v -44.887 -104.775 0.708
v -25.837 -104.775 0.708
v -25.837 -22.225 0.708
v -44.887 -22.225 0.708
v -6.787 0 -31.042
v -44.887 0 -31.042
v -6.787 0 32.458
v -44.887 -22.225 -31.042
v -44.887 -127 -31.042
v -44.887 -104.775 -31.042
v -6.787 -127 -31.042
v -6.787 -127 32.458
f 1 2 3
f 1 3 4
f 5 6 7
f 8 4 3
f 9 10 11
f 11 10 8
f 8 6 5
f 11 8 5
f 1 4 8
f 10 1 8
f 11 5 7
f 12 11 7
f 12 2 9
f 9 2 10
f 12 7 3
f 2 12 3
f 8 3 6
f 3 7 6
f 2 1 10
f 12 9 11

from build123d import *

# Parameters (mm, degrees)
F1_DEPTH = 127
F2_DEPTH = 127
F4_DEPTH = 22.225
F5_DEPTH = 22.225


with BuildPart() as f1:
    # F0 (on Front) → F1 (new body)
    with BuildSketch(Plane.XZ):
        Polygon((-25.837215, 0.707869), (-44.887215, -31.042131), (-6.787215, -31.042131), (-6.787215, 32.457869), align=None)
    extrude(amount=F1_DEPTH)

    # F0 (on Front) → F2 (join)
    with BuildSketch(Plane.XZ):
        Polygon((-44.887215, 0), (-44.887215, -31.042131), (-25.837215, 0.707869), (-44.887215, 0.707869), align=None)
    extrude(amount=F2_DEPTH)

    # F3 (on face) → F4 (cut)
    with BuildSketch(Plane.XZ.offset(127)):
        Polygon((-44.887215, 0.707869), (-44.887215, -31.042131), (-25.837215, 0.707869), align=None)
    extrude(amount=-F4_DEPTH, mode=Mode.SUBTRACT)

    # F0 (on Front) → F5 (cut)
    with BuildSketch(Plane.XZ):
        Polygon((-44.887215, 0), (-44.887215, -31.042131), (-25.837215, 0.707869), (-44.887215, 0.707869), align=None)
    extrude(amount=F5_DEPTH, mode=Mode.SUBTRACT)


solid = f1.part
